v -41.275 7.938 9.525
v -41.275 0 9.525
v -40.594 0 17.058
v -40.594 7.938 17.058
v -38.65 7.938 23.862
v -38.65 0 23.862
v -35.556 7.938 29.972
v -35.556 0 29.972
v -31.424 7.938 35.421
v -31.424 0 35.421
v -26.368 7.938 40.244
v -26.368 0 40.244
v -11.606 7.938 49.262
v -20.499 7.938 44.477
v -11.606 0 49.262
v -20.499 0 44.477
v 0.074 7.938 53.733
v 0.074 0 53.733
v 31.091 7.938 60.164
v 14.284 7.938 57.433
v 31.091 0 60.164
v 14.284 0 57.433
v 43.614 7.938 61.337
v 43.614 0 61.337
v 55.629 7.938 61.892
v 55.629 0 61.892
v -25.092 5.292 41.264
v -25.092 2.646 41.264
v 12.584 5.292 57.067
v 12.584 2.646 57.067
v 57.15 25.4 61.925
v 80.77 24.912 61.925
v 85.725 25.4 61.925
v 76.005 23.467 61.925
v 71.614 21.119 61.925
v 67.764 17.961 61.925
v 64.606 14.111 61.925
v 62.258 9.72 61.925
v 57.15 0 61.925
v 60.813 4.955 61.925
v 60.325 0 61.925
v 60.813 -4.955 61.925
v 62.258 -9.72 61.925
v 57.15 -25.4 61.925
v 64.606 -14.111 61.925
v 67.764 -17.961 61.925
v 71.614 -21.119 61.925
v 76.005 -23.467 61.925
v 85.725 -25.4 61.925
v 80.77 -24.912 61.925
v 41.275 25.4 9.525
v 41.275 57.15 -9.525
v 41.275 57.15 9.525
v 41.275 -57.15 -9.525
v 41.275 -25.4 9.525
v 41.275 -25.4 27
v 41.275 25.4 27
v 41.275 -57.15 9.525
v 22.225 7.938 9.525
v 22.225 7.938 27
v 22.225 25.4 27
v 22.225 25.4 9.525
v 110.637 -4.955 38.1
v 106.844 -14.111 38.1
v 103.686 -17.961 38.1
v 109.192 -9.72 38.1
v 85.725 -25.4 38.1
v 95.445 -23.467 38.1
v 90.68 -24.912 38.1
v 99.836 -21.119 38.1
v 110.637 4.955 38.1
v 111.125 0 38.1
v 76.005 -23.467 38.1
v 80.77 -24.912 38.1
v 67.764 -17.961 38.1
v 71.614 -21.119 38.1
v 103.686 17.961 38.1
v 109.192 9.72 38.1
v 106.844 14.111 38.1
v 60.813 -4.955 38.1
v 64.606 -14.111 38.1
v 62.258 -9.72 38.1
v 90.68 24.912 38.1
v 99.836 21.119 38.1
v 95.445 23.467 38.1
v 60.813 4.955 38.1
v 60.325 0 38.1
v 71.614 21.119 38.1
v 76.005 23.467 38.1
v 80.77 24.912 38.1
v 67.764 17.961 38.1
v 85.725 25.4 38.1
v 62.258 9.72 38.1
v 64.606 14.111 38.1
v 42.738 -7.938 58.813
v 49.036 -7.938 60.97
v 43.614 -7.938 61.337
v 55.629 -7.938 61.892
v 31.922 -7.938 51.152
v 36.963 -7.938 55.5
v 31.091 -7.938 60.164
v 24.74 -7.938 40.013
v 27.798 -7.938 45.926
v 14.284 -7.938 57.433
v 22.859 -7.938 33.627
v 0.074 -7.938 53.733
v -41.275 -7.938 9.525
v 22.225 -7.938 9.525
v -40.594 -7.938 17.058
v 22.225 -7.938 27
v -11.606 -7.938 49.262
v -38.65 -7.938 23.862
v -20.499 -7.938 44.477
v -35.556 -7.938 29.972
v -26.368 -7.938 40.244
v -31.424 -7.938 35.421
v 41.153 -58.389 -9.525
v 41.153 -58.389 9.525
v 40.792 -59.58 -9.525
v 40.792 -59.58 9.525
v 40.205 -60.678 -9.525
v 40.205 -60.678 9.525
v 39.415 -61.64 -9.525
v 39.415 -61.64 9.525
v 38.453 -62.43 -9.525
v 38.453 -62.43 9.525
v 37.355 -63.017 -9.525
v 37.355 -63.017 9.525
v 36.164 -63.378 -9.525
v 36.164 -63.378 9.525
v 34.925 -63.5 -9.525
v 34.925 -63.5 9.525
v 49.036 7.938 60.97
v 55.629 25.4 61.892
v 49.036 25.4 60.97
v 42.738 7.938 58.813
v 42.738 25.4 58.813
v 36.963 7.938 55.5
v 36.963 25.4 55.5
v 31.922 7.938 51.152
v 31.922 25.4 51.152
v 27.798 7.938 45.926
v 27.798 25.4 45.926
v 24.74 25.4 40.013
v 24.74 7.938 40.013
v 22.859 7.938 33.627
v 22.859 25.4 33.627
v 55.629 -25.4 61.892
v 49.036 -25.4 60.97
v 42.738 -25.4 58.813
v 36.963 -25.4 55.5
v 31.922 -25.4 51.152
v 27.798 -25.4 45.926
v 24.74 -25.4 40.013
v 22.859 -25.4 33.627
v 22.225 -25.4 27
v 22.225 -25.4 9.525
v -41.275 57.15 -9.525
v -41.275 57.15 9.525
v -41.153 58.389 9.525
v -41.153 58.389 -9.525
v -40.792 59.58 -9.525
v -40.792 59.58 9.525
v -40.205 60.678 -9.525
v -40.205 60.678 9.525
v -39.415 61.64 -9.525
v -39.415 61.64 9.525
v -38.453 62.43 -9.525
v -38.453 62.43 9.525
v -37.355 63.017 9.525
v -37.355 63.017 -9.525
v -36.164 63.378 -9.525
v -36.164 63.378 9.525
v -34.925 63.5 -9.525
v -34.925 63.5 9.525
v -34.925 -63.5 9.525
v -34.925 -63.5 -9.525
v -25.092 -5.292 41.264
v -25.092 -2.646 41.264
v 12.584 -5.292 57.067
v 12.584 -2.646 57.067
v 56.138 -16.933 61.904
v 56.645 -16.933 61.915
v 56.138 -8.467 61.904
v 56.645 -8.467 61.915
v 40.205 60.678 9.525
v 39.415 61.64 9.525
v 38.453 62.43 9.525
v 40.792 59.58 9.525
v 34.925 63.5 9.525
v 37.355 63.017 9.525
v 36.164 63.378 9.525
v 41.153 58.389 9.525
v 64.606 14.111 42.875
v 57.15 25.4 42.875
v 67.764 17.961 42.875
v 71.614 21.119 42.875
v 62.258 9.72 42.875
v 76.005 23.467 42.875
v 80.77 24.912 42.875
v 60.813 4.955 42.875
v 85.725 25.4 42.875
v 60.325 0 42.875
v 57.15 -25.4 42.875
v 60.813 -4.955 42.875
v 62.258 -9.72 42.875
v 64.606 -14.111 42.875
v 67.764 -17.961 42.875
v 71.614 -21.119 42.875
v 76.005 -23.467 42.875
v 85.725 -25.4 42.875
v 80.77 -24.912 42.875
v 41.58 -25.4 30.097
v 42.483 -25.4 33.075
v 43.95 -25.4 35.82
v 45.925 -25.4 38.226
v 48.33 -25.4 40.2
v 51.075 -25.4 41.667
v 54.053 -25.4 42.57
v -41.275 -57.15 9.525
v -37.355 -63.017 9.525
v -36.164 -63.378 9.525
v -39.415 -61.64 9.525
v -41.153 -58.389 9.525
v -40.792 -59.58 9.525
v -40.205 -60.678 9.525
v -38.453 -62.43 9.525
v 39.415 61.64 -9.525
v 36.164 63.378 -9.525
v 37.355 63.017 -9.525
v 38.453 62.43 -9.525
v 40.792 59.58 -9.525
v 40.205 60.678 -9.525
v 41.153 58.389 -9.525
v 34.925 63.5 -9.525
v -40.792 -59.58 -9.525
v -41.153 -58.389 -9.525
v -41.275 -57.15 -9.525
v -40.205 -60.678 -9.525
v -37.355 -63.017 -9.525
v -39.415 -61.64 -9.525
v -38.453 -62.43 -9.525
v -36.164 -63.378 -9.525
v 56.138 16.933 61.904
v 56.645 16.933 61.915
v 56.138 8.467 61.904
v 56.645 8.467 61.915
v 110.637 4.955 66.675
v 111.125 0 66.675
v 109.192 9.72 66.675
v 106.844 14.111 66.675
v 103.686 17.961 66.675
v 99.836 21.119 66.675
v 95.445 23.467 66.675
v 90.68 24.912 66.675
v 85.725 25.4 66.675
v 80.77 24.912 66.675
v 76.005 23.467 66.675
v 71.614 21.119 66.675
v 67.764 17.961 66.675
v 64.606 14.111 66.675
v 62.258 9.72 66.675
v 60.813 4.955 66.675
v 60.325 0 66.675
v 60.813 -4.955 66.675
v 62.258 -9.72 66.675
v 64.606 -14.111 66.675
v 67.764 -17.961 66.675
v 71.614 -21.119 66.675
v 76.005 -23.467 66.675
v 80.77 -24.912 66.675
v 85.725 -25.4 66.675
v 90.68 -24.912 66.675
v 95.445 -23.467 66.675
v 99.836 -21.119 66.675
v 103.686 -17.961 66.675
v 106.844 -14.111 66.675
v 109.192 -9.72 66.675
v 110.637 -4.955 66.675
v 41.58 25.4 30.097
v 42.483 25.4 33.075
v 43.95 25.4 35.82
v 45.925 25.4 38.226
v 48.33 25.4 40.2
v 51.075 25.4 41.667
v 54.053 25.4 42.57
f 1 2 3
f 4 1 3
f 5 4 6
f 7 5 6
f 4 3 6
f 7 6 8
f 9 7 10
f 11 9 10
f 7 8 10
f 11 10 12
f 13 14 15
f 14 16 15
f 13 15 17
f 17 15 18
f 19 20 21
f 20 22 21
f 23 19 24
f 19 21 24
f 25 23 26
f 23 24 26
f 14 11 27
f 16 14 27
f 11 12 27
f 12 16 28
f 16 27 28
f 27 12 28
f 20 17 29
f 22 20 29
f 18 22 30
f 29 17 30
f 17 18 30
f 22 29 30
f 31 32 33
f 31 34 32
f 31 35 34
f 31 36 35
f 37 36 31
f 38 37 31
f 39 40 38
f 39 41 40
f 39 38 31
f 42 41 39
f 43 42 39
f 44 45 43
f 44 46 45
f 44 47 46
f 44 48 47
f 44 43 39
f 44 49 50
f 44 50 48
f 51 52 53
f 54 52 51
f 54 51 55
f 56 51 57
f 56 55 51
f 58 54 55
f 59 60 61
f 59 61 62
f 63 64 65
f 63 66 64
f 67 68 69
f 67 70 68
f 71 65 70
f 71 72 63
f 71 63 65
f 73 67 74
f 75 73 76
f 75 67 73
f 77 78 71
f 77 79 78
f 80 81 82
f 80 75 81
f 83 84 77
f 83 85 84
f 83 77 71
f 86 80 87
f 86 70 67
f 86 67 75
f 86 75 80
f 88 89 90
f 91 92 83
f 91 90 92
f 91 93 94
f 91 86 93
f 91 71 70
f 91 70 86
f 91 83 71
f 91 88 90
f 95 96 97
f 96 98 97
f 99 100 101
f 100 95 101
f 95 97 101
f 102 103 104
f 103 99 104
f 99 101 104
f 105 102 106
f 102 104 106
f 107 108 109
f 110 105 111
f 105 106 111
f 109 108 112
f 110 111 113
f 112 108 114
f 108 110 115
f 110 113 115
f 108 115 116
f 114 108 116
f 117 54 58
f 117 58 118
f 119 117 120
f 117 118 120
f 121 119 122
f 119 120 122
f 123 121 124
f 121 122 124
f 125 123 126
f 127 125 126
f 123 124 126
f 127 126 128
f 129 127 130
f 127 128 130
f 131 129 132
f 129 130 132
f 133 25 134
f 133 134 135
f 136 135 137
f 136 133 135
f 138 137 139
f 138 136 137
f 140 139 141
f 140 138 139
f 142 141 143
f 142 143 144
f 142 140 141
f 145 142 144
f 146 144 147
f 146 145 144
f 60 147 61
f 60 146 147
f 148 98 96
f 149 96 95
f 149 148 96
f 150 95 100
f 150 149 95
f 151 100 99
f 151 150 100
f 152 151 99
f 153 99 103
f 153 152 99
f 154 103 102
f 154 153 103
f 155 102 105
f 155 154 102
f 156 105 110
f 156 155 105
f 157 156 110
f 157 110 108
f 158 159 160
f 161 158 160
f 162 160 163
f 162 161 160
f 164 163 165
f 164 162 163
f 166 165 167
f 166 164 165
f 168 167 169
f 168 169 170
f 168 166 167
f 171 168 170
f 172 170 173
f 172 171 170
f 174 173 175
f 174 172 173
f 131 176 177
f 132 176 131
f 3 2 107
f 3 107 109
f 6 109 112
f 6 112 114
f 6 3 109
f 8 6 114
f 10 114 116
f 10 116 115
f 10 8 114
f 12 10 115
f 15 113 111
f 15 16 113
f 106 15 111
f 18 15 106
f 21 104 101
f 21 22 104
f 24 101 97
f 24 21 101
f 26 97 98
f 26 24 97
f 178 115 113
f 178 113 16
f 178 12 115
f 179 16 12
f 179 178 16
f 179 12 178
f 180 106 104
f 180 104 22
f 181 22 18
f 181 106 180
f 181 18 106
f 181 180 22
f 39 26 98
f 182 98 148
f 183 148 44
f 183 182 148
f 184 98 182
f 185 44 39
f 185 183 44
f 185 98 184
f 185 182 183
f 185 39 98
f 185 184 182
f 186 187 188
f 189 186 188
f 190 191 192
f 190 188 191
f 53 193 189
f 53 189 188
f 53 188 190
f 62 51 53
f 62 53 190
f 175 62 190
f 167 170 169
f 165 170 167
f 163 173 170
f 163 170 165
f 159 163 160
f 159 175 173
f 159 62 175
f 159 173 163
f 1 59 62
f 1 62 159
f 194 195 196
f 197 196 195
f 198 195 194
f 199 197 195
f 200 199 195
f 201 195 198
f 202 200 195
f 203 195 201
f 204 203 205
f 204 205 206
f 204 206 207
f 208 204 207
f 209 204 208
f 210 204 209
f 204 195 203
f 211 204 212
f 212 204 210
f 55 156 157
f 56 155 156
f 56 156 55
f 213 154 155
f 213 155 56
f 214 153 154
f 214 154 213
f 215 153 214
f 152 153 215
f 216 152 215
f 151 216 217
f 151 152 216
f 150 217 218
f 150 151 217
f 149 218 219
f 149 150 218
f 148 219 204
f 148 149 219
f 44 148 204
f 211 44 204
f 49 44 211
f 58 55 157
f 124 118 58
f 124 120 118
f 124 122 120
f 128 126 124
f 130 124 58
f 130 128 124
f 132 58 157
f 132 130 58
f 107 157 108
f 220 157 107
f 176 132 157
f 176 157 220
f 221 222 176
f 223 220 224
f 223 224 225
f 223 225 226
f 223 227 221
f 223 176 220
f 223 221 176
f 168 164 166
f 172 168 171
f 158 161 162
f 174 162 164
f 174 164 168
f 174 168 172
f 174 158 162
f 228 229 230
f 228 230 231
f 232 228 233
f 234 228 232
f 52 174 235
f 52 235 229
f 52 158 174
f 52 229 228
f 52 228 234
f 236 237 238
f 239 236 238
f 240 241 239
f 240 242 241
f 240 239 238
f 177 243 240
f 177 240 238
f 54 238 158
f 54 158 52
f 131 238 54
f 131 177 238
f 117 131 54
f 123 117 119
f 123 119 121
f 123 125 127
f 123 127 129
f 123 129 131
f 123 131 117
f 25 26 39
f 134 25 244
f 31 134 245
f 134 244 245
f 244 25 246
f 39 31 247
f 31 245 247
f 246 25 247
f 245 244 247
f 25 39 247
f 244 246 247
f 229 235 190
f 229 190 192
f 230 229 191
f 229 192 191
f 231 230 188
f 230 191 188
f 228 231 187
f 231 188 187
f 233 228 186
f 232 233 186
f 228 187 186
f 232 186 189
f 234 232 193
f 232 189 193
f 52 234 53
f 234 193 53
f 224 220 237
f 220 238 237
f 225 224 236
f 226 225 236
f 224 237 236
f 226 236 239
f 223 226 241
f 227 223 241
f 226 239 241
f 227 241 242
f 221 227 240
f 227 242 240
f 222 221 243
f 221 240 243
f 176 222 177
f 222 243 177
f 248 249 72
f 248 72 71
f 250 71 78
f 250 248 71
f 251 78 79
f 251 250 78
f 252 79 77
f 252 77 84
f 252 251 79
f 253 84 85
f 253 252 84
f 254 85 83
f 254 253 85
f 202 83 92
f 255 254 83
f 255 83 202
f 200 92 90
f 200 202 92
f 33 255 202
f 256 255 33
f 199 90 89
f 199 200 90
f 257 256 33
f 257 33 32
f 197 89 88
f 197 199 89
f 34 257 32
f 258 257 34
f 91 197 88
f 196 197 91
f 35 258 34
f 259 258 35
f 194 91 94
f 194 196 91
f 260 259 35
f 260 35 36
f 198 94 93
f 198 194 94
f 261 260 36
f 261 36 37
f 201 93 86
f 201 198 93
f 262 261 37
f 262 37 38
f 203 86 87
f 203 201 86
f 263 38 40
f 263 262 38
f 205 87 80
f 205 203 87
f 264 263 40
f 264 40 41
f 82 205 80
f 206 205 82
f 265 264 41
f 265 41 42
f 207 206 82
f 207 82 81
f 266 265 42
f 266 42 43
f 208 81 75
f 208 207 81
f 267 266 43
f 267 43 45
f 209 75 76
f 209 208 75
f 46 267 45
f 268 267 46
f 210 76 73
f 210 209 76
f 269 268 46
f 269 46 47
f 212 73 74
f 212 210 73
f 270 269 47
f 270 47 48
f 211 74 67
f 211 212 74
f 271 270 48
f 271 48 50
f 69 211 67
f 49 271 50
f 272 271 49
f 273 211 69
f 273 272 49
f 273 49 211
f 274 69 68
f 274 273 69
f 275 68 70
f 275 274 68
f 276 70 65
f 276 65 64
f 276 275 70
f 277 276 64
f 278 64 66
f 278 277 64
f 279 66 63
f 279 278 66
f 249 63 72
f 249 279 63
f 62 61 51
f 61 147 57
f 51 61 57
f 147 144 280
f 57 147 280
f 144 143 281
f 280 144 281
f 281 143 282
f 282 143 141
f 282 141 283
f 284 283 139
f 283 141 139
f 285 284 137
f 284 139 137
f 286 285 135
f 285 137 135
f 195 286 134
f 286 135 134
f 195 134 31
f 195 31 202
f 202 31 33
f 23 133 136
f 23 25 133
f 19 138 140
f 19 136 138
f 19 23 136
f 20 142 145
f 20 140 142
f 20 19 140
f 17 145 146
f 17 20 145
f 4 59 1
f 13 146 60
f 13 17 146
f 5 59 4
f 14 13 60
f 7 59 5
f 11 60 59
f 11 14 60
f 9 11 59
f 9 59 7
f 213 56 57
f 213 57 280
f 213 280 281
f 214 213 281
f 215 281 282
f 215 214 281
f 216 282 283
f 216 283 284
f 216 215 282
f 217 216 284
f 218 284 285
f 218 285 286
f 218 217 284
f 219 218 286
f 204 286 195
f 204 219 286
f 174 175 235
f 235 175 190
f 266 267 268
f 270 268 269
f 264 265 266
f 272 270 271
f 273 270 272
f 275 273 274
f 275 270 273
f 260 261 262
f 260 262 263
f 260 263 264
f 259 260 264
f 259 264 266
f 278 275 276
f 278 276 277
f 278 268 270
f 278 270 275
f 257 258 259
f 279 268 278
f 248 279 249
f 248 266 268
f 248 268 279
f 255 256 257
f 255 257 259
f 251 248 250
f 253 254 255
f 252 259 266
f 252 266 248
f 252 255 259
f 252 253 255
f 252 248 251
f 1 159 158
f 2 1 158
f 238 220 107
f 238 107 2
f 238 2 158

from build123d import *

# Parameters (mm, degrees)
F1_DEPTH = 63.5
F0_W     = 25.4
F0_H     = 19.05
F2_DEPTH = 25.4
F3_DEPTH = 7.9375
F5_R     = 6.35
F6_R     = 6.35


# Not quite as in the source:
# - a feature names something its author has since deleted; it is built from what else it names


with BuildPart() as f1:
    # F0 (on Front) → F1 (new body, symmetric)
    with BuildSketch(Plane.XZ):
        Polygon((22.225, 9.525), (-41.275, 9.525), (-41.275, -9.525), (41.275, -9.525), (41.275, 9.525), align=None)
    extrude(amount=F1_DEPTH, both=True)

    # F0 (on Front) → F2 (join, symmetric)
    with BuildSketch(Plane.XZ):
        with BuildLine():
            Line((22.225, 27.0002), (22.225, 9.525))
            Line((22.225, 9.525), (41.275, 9.525))
            Line((41.275, 9.525), (41.275, 27.0002))
            ThreePointArc((41.275, 27.0002), (45.9246798487, 38.2255201513), (57.15, 42.8752))
            Line((57.15, 42.8752), (60.325, 42.8752))
            Line((60.325, 42.8752), (60.325, 61.9252))
            Line((60.325, 61.9252), (57.15, 61.9252))
            add(Edge.make_bspline(
                [(55.6286861057, 61.8920504673), (56.1384142752, 61.9045266367), (56.6455676592, 61.915561496), (57.15, 61.9252)],
                knots=[110.1136190258, 110.1136190258, 110.1136190258, 110.1136190258, 111.5045361635, 111.5045361635, 111.5045361635, 111.5045361635], degree=3))
            ThreePointArc((55.6286861057, 61.8920504673), (31.9221630658, 51.1520502111), (22.225, 27.0002))
        make_face()
        with Locations((73.025, 52.4002)):
            Rectangle(F0_W, F0_H)
    extrude(amount=F2_DEPTH, both=True)

    # F0 (on Front) → F3 (join, symmetric)
    with BuildSketch(Plane.XZ):
        with BuildLine():
            add(Edge.make_bspline(
                [(-41.275, 9.525), (-41.2147135228, 50.8835652719), (15.2754458257, 60.9043595954), (55.6286861057, 61.8920504673)],
                knots=[0, 0, 0, 0, 110.1136190258, 110.1136190258, 110.1136190258, 110.1136190258], degree=3))
            Line((-41.275, 9.525), (22.225, 9.525))
            Line((22.225, 9.525), (22.225, 27.0002))
            ThreePointArc((22.225, 27.0002), (31.9221630658, 51.1520502111), (55.6286861057, 61.8920504673))
        make_face()
    extrude(amount=F3_DEPTH, both=True)

    # F0 (on Front) → F4 (revolve)
    with BuildSketch(Plane.XZ):
        Polygon((85.725, 66.675), (85.725, 61.9252), (85.725, 42.8752), (85.725, 38.1), (111.125, 38.1), (111.125, 66.675), align=None)
    revolve(axis=Axis((85.725, 0, 52.4002), (0, 0, 1)))

    # F5
    f5_edges = [f1.edges().sort_by_distance(p)[0] for p in [
        (-41.275, 63.5, 0),
    ]]
    fillet(f5_edges, radius=F5_R)

    # F6
    f6_edges = [f1.edges().sort_by_distance(p)[0] for p in [
        (-41.275, -63.5, 0),
        (41.275, 63.5, 0),
        (41.275, -63.5, 0),
    ]]
    fillet(f6_edges, radius=F6_R)


solid = f1.part
